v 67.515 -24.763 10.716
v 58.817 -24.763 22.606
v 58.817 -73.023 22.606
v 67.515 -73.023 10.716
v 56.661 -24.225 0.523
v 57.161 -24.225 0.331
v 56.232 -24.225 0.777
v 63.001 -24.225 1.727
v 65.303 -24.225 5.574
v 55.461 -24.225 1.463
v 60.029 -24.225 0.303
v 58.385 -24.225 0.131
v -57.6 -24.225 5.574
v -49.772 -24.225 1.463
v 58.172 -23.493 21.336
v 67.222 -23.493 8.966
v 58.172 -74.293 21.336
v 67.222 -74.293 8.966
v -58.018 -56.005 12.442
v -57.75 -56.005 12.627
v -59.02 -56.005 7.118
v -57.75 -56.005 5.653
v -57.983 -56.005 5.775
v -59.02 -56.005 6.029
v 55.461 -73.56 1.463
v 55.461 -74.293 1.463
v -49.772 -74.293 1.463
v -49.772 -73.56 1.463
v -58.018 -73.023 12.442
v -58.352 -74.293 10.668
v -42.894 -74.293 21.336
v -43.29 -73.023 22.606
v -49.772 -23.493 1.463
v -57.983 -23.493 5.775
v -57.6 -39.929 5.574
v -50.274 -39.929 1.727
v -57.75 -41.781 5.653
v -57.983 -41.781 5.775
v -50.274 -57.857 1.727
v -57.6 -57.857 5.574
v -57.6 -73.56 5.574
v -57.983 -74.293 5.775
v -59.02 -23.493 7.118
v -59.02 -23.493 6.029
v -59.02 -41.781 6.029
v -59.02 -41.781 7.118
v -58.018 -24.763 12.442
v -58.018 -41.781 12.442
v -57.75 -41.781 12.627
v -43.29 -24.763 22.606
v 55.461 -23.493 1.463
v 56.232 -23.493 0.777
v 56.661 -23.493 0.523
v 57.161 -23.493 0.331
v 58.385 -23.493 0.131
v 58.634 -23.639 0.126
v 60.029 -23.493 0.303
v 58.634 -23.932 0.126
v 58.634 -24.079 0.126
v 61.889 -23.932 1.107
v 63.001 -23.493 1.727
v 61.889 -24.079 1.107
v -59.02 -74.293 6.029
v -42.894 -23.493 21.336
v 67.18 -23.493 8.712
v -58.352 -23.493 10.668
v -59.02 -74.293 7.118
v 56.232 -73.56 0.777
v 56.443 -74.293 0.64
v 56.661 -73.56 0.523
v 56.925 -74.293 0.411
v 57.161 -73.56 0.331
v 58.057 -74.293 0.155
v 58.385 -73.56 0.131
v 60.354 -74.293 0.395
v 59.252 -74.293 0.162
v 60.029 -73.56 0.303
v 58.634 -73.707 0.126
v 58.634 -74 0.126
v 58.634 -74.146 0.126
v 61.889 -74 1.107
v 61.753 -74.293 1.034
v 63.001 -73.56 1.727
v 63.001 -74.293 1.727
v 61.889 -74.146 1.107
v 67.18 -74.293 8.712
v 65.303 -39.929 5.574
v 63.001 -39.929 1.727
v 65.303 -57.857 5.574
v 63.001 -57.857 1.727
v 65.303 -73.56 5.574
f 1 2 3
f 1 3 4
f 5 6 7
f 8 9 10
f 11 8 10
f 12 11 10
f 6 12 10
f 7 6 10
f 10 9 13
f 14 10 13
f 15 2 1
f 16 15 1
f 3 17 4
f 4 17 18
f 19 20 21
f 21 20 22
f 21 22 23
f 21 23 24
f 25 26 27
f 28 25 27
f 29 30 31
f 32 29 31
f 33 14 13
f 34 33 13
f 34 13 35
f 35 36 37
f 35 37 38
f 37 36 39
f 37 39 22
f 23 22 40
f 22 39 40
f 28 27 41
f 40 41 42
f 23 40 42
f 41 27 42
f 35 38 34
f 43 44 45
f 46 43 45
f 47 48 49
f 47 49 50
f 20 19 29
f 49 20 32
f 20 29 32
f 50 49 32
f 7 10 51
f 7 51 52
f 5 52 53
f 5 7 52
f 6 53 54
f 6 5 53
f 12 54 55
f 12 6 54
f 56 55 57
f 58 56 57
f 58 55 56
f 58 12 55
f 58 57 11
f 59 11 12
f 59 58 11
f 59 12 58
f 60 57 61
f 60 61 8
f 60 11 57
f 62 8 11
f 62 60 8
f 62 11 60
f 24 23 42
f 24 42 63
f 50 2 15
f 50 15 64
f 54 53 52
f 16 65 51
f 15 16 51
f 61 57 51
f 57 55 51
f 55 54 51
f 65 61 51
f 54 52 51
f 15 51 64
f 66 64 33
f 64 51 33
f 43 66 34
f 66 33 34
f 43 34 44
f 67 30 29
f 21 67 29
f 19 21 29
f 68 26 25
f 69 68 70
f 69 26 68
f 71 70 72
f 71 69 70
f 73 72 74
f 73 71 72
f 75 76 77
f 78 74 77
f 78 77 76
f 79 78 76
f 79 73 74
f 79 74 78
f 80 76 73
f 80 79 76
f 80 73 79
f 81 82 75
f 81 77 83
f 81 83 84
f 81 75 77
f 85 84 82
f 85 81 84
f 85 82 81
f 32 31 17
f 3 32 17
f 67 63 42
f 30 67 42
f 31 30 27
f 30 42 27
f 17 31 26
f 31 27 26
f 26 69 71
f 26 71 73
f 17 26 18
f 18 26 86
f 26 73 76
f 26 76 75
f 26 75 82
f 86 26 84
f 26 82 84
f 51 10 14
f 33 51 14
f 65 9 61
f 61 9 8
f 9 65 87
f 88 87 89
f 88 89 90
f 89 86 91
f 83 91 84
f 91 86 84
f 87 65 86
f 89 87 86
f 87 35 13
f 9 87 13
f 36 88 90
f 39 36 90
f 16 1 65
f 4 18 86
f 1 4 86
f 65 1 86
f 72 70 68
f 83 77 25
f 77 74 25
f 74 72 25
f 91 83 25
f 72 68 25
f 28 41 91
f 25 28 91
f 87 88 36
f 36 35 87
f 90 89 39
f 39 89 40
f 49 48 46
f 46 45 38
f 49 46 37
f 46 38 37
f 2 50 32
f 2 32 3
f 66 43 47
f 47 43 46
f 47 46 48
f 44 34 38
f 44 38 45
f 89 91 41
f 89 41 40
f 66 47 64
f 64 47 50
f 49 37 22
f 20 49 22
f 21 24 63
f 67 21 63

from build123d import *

# Parameters (mm, degrees)
F1_DEPTH = 22.606
F3_DEPTH = 56.642
F5_DEPTH = 123.952
F6_W     = 17.9281285021
F6_H     = 3.7313278299
F7_DEPTH = 131.318
F8_SIZE  = 1.27


with BuildPart() as f1:
    # F0 (on Top) → F1 (new body)
    with BuildSketch(Plane.XY):
        Polygon((67.9795068204, -48.892733641), (67.9795068204, -23.492733641), (-59.0204931796, -23.492733641), (-59.0204931796, -41.780733641), (-57.7496923506, -41.780733641), (-57.7496923506, -48.892733641), (-57.7496923506, -56.004733641), (-59.0204931796, -56.004733641), (-59.0204931796, -74.292733641), (67.9795068204, -74.292733641), align=None)
    extrude(amount=F1_DEPTH)

    # F2 (on face) → F3 (cut)
    with BuildSketch(Plane.XZ.offset(74.292733641)):
        Polygon((-59.0204931796, 22.606), (-59.0204931796, 7.1184414792), (-58.0175313886, 12.4418523751), (-43.2899855077, 22.606), align=None)
        with BuildLine():
            Line((55.4608365675, 1.4634394883), (-49.7719274679, 1.4634394883))
            Line((-49.7719274679, 1.4634394883), (-57.9830260793, 5.7754135323))
            Line((-57.9830260793, 5.7754135323), (-59.0204931796, 6.0288892267))
            Line((-59.0204931796, 6.0288892267), (-59.0204931796, 0))
            Line((-59.0204931796, 0), (67.9795068204, 0))
            Line((67.9795068204, 0), (67.9795068204, 22.606))
            Line((67.9795068204, 22.606), (58.8168874383, 22.606))
            Line((58.8168874383, 22.606), (67.5153278326, 10.7161320989))
            Line((67.5153278326, 10.7161320989), (67.1798294962, 8.7120201094))
            Line((67.1798294962, 8.7120201094), (63.0014389753, 1.7273251433))
            add(Edge.make_bspline(
                [(55.4608365675, 1.4634394883), (55.7992606547, 1.1248105944), (56.5402688521, 0.3862817839), (58.6439188352, -0.0157318094), (60.613555974, 0.3869426535), (61.8581460025, 1.1113634898), (62.6646578312, 1.4950803015), (63.0014389753, 1.7273251433)],
                knots=[0, 0, 0, 0, 0.1896033215, 0.4147497426, 0.6360801274, 0.8233787666, 1, 1, 1, 1], degree=3))
        make_face()
    extrude(amount=-F3_DEPTH, mode=Mode.SUBTRACT)

    # F4 (on face) → F5 (cut)
    with BuildSketch(Plane(origin=(-57.7496923506, 0, 0), x_dir=(0, -1, 0), z_dir=(-1, 0, 0))):
        Polygon((39.9286693899, 5.5741476826), (24.2253392935, 5.5741476826), (24.2253392935, 0.5848236615), (24.2253392935, -3.517596783), (39.9286693899, -3.517596783), (39.9286693899, 0.5848236615), align=None)
        Polygon((73.5601279885, 5.5741476826), (57.856797892, 5.5741476826), (57.856797892, 0.5848236615), (57.856797892, -3.517596783), (73.5601279885, -3.517596783), (73.5601279885, 0.5848236615), align=None)
    extrude(amount=-F5_DEPTH, mode=Mode.SUBTRACT)

    # F6 (on face) → F7 (cut)
    with BuildSketch(Plane(origin=(-57.7496923506, 0, 0), x_dir=(0, -1, 0), z_dir=(-1, 0, 0))):
        with Locations((48.892733641, -0.1383387716)):
            Rectangle(F6_W, F6_H)
    extrude(amount=-F7_DEPTH, mode=Mode.SUBTRACT)

    # F8
    f8_edges = [f1.edges().sort_by_distance(p)[0] for p in [
        (-50.653758, -23.492734, 17.523926),
        (-50.653758, -74.292734, 17.523926),
        (7.763451, -23.492734, 22.606),
        (7.763451, -74.292734, 22.606),
        (63.166108, -74.292734, 16.661066),
        (63.166108, -23.492734, 16.661066),
    ]]
    chamfer(f8_edges, length=F8_SIZE)


solid = f1.part
